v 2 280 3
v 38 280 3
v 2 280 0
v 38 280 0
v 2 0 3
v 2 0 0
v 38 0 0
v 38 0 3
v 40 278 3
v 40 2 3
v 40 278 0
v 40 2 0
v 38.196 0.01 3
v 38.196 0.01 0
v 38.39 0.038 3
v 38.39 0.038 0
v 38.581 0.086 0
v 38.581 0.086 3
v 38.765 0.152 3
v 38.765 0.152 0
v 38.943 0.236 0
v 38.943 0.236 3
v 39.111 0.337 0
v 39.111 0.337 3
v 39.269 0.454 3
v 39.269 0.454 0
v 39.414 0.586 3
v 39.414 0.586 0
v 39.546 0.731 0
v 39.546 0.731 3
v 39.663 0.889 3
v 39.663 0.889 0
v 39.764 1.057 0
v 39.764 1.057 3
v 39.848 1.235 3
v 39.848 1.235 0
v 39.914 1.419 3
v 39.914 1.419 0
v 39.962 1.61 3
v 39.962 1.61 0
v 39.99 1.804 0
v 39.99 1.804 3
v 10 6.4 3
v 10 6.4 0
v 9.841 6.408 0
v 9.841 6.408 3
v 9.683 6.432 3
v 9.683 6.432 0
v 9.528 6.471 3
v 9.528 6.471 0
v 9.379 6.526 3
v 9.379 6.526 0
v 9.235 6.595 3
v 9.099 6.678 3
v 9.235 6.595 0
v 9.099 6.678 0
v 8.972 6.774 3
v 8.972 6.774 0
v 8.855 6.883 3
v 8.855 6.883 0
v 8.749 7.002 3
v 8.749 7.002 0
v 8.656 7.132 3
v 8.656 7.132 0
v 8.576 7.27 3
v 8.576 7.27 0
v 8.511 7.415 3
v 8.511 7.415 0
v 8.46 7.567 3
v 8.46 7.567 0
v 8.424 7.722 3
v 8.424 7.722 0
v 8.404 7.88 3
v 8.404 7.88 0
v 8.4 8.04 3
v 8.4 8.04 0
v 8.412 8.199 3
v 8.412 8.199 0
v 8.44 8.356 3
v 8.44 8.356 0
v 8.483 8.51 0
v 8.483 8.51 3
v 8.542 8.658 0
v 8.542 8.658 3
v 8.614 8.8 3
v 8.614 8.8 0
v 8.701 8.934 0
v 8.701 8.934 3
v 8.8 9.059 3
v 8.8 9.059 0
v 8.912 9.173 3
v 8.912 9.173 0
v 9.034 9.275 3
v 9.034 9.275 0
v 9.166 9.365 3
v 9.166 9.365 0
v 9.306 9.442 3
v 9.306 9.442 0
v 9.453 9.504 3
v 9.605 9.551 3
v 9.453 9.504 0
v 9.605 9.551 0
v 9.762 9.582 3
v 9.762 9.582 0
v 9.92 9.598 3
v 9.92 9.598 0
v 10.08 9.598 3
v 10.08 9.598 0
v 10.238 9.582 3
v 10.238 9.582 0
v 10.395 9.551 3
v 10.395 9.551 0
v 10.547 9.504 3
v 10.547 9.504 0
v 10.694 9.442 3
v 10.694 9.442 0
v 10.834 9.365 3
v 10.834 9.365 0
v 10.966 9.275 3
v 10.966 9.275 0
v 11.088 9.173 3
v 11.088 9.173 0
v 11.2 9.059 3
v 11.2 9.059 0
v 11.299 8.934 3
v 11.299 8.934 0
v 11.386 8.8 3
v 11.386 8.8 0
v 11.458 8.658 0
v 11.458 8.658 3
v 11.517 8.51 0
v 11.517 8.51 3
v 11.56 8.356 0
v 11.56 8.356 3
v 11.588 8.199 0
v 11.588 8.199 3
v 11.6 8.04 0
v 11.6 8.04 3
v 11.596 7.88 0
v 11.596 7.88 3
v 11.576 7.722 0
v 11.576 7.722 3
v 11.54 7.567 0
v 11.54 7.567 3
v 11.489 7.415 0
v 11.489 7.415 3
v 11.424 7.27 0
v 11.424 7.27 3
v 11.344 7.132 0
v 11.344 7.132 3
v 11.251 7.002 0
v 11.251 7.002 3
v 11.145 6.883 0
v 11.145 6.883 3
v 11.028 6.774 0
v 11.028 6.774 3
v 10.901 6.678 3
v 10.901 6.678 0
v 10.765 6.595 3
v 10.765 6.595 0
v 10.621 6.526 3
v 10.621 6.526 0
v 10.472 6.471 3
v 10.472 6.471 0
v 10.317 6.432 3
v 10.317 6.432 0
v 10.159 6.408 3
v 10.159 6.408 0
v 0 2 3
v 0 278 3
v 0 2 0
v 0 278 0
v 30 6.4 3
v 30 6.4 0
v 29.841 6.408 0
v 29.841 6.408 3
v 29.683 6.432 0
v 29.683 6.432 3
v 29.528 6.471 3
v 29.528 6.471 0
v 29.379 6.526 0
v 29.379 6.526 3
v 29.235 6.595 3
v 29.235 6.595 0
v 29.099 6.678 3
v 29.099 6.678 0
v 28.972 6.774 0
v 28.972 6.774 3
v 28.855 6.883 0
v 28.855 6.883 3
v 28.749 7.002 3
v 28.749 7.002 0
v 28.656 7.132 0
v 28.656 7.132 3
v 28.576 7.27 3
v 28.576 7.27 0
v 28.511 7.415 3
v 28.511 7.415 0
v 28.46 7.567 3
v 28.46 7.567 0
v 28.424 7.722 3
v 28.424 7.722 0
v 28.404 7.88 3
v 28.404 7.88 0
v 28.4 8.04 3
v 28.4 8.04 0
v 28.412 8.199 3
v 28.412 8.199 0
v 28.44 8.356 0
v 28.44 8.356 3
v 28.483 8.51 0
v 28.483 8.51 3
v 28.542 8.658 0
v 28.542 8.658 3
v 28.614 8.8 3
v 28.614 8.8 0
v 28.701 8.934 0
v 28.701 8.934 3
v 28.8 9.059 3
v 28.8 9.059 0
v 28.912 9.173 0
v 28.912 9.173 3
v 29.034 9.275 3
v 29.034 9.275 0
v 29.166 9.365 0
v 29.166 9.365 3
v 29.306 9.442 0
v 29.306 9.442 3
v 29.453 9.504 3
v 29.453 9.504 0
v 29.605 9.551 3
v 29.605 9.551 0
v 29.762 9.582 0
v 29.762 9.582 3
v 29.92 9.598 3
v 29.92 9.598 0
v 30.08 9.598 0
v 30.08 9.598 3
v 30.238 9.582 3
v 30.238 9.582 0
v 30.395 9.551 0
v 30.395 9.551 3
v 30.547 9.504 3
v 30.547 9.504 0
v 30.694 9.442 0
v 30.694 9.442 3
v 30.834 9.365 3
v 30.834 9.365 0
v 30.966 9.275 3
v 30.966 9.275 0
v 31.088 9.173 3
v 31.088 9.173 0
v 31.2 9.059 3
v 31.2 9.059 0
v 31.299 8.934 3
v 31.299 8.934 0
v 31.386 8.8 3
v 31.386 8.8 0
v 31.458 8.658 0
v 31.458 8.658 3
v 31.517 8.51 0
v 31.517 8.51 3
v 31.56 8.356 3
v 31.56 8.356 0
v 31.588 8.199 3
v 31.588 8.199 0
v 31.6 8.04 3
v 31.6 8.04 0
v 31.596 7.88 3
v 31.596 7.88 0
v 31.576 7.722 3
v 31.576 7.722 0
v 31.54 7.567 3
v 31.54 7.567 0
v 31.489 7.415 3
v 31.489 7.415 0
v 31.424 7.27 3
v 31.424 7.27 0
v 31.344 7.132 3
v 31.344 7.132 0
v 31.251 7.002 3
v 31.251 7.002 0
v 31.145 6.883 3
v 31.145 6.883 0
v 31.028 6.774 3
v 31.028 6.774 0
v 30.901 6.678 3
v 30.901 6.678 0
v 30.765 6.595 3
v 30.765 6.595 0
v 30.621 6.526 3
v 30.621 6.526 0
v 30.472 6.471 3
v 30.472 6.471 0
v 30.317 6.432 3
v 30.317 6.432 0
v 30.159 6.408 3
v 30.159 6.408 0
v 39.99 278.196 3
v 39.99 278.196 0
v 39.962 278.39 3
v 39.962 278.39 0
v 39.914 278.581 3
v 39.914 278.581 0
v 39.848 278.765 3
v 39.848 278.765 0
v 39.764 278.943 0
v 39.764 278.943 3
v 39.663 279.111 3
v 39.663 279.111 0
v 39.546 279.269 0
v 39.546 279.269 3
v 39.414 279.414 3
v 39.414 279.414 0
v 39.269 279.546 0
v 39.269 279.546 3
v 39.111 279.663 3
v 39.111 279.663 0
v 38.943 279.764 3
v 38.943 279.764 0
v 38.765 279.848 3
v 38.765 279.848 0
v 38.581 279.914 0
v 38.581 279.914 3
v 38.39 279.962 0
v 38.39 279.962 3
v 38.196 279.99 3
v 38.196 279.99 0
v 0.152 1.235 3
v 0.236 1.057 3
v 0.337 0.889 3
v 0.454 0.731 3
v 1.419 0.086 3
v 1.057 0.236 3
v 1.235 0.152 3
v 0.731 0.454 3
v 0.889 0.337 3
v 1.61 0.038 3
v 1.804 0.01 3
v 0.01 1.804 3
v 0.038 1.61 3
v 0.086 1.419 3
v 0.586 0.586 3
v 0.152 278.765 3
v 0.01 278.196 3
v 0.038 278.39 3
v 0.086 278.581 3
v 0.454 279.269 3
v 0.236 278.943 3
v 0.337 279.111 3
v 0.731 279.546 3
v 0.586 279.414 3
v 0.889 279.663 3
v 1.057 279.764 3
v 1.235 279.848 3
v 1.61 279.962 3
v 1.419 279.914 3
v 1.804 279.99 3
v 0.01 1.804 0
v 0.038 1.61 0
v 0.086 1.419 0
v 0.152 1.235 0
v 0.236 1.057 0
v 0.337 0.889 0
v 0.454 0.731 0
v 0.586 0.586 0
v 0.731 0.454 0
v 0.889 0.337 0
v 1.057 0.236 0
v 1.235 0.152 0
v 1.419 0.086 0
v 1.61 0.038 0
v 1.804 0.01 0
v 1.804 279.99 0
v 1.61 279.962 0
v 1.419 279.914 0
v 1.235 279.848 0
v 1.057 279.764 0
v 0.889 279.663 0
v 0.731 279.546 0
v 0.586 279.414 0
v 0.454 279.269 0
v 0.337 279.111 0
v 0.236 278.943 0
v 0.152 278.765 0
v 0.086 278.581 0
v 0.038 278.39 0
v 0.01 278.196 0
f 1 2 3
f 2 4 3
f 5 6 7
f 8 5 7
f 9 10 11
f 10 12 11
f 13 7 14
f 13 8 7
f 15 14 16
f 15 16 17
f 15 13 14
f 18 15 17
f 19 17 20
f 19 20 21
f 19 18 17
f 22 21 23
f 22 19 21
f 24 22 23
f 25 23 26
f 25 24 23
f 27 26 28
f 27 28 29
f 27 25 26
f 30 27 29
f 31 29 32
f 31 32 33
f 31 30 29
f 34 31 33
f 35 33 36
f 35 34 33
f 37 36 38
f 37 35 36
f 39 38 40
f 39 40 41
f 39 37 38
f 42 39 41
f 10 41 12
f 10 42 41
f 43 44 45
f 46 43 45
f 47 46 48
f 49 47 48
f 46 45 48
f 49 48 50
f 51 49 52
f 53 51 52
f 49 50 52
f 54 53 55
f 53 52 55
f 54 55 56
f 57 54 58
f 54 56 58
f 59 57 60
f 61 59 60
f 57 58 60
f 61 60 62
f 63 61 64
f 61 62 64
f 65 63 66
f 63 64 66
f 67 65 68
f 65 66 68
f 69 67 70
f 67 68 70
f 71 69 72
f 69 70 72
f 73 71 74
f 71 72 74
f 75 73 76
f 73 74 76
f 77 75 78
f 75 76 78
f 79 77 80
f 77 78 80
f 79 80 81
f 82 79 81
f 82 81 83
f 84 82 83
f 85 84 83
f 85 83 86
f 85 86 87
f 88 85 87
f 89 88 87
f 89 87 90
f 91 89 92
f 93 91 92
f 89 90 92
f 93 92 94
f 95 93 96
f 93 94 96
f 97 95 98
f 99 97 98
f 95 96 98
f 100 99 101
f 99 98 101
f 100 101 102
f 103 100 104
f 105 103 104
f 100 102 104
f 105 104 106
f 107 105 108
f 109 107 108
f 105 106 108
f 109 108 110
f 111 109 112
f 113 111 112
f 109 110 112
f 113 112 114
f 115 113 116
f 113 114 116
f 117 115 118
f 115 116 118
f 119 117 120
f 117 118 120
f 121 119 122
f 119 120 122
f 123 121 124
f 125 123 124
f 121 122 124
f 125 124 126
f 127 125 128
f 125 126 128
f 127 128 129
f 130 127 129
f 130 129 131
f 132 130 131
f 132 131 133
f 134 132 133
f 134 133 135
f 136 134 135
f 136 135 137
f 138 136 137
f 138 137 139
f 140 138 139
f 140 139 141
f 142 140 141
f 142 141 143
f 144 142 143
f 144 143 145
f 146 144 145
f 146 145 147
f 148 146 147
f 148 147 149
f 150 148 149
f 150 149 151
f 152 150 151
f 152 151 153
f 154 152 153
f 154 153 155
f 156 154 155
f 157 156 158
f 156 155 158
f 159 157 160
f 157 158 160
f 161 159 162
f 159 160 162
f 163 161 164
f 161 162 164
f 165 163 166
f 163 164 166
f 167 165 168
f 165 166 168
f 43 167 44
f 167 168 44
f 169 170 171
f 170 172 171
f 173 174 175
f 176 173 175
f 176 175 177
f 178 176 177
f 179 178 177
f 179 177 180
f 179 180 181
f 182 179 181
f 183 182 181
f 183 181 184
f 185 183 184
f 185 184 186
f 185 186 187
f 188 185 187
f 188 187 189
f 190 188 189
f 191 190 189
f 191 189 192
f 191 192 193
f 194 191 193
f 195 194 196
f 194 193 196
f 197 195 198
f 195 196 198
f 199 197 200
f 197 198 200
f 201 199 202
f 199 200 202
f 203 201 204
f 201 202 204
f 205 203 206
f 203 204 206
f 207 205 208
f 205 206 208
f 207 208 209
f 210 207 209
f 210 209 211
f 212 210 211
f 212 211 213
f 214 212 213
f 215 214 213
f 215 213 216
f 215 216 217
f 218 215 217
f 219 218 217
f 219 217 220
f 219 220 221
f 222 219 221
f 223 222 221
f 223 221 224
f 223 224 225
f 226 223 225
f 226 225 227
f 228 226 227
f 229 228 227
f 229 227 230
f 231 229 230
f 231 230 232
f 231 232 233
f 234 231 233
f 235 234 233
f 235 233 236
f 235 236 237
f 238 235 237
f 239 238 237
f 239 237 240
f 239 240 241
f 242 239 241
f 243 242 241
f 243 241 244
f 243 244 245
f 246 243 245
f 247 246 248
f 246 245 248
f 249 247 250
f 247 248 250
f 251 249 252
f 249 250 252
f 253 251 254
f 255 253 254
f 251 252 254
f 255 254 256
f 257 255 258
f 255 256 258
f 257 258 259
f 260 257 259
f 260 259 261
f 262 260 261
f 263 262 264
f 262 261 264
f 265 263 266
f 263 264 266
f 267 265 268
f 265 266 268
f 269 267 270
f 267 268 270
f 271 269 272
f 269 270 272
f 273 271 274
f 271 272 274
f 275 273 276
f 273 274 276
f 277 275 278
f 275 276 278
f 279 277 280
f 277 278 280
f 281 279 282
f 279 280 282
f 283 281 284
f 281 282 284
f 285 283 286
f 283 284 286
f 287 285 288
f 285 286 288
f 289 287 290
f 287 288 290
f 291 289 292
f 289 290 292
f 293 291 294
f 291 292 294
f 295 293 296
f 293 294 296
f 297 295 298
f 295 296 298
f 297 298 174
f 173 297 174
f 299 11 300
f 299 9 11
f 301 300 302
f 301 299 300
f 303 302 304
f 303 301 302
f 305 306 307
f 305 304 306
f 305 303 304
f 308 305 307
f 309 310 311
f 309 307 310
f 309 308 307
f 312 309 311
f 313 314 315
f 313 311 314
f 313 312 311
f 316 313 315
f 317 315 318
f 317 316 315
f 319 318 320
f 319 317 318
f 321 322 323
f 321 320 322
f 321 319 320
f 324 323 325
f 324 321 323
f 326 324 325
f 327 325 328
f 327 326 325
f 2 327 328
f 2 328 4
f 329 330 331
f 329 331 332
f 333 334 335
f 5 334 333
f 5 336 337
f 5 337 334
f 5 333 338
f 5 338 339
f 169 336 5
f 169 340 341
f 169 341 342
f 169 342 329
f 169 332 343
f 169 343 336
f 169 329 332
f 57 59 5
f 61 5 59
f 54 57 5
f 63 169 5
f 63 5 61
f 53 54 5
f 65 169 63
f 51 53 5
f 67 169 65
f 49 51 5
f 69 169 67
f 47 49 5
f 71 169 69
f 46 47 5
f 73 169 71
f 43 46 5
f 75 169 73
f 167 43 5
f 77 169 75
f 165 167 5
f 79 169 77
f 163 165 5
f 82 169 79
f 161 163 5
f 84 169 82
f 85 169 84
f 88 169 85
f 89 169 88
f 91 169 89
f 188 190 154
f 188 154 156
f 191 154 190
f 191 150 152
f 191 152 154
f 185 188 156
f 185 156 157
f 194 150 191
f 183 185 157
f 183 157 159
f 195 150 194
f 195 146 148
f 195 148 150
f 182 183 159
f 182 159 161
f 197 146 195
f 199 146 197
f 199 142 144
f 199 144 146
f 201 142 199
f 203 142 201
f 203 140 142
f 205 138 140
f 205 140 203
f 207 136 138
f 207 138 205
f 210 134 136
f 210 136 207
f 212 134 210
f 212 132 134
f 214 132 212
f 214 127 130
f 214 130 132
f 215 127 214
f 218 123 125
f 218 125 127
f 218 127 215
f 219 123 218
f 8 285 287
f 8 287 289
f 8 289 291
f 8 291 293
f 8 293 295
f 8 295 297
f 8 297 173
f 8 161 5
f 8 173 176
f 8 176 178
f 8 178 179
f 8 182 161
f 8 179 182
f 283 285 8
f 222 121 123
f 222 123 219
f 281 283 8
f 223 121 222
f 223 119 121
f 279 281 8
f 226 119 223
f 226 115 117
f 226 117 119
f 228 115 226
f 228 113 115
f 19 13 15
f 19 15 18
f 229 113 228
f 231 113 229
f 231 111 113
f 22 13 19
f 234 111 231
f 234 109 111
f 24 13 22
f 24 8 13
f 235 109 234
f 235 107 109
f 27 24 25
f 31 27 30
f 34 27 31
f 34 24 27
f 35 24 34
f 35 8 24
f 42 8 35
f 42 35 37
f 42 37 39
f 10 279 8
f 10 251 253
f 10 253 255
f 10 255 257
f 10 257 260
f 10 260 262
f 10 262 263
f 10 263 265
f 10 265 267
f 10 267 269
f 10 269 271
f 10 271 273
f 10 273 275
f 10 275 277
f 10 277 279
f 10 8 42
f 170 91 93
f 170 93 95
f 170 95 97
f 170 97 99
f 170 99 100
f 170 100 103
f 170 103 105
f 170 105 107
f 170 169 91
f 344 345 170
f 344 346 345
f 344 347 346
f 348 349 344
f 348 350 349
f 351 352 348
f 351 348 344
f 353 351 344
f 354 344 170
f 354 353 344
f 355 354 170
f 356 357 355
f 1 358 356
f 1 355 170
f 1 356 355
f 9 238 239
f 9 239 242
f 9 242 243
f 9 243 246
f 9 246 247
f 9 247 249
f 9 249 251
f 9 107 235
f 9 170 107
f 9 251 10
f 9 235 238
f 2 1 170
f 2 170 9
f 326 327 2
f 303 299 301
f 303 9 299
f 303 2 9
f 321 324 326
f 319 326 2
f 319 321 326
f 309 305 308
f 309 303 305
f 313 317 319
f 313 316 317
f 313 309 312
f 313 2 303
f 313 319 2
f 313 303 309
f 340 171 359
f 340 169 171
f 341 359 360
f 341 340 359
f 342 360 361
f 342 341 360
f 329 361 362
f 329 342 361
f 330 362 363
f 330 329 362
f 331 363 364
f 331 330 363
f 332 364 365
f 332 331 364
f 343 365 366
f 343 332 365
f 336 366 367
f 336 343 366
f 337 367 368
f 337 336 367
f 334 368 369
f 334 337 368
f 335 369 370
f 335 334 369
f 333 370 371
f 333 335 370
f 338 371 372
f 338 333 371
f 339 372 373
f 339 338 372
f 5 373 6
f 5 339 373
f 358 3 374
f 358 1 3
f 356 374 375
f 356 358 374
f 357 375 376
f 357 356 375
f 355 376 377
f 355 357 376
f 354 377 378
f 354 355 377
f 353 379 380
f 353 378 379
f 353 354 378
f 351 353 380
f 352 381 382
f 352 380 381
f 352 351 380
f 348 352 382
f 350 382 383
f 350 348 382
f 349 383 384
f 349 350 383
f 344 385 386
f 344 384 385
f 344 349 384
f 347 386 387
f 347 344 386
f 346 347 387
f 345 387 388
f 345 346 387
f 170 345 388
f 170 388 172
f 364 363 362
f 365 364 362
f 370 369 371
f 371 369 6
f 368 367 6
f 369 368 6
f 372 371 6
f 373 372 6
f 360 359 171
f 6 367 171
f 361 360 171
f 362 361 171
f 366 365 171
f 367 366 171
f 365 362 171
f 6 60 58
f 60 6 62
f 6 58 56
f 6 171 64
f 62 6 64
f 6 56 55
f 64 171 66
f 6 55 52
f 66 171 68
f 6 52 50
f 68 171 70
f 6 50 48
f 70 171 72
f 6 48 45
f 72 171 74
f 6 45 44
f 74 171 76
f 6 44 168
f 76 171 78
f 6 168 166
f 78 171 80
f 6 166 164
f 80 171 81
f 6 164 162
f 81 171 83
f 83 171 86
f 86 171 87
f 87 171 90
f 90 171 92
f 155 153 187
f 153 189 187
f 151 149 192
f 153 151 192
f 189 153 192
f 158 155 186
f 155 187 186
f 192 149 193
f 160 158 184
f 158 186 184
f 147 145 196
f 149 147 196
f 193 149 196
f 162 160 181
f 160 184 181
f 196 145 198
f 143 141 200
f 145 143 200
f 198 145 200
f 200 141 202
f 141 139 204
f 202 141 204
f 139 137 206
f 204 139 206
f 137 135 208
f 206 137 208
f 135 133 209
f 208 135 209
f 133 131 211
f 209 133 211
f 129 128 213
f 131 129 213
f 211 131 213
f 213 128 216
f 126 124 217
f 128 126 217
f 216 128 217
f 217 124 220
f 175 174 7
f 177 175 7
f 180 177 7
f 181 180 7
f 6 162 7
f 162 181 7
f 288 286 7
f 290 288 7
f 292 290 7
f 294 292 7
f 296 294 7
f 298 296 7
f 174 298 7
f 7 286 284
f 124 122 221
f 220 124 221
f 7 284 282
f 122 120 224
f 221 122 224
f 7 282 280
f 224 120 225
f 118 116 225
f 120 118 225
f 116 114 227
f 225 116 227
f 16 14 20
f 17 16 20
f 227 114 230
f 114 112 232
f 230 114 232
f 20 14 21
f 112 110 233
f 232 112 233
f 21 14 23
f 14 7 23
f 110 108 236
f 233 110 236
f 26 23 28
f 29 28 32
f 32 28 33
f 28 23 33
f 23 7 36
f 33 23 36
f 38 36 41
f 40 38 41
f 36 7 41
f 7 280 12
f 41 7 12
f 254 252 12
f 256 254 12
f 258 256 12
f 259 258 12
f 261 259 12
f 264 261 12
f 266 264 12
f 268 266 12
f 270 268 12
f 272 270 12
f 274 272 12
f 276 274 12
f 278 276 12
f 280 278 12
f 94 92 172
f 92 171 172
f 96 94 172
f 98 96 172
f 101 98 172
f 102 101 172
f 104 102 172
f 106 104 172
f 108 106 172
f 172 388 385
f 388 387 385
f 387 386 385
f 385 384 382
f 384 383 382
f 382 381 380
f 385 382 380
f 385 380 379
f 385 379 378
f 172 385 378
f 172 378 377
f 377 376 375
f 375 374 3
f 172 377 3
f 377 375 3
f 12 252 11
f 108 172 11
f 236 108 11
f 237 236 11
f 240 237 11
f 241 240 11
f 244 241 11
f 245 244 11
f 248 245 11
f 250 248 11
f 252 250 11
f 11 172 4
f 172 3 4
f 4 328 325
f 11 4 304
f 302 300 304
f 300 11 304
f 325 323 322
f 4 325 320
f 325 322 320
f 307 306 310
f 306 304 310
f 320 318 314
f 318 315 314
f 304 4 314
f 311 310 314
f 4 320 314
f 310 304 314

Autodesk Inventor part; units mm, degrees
ref_plane "YZ Plane" through (0, 0, 0) normal (1, 0, 0) x (0, 1, 0)
ref_plane "XZ Plane" through (0, 0, 0) normal (0, 1, 0) x (-1, 0, 0)
ref_plane "XY Plane" through (0, 0, 0) normal (0, 0, 1) x (1, 0, 0)
sketch "スケッチ1" plane through (0, 0, 0) normal (0, 0, 1) x (1, 0, 0)
  line L0 (0, 0) -> (40, 0)
  line L1 (40, 0) -> (40, 280)
  line L2 (40, 280) -> (0, 280)
  line L3 (0, 280) -> (0, 0)
  dimension "d0" = 40
  dimension "d1" = 280
extrude "押し出し1" add sketch "スケッチ1" along normal blind 3
sketch "スケッチ2" plane through (0, 0, 3) normal (0, 0, 1) x (1, 0, 0)
  line L0 (0, 280) -> (0, 0) projected
  line L1 (0, 0) -> (40, 0) projected
  point P0 (10, 8)
  point P1 (30, 8)
  point P2 (20, 0)
  dimension "d4" = 20
  dimension "d5" = 10
  dimension "d6" = 8
hole "穴1" at (10, 8, 3) at (30, 8, 3) direction (0, 0, -1) diameter 3.2 end through all
fillet "フィレット1" radius 2 4 edges at (0, 0, 1.5) (40, 0, 1.5) (0, 280, 1.5) (40, 280, 1.5)
properties part number "BP_BOX-Support-Bar-Front"
